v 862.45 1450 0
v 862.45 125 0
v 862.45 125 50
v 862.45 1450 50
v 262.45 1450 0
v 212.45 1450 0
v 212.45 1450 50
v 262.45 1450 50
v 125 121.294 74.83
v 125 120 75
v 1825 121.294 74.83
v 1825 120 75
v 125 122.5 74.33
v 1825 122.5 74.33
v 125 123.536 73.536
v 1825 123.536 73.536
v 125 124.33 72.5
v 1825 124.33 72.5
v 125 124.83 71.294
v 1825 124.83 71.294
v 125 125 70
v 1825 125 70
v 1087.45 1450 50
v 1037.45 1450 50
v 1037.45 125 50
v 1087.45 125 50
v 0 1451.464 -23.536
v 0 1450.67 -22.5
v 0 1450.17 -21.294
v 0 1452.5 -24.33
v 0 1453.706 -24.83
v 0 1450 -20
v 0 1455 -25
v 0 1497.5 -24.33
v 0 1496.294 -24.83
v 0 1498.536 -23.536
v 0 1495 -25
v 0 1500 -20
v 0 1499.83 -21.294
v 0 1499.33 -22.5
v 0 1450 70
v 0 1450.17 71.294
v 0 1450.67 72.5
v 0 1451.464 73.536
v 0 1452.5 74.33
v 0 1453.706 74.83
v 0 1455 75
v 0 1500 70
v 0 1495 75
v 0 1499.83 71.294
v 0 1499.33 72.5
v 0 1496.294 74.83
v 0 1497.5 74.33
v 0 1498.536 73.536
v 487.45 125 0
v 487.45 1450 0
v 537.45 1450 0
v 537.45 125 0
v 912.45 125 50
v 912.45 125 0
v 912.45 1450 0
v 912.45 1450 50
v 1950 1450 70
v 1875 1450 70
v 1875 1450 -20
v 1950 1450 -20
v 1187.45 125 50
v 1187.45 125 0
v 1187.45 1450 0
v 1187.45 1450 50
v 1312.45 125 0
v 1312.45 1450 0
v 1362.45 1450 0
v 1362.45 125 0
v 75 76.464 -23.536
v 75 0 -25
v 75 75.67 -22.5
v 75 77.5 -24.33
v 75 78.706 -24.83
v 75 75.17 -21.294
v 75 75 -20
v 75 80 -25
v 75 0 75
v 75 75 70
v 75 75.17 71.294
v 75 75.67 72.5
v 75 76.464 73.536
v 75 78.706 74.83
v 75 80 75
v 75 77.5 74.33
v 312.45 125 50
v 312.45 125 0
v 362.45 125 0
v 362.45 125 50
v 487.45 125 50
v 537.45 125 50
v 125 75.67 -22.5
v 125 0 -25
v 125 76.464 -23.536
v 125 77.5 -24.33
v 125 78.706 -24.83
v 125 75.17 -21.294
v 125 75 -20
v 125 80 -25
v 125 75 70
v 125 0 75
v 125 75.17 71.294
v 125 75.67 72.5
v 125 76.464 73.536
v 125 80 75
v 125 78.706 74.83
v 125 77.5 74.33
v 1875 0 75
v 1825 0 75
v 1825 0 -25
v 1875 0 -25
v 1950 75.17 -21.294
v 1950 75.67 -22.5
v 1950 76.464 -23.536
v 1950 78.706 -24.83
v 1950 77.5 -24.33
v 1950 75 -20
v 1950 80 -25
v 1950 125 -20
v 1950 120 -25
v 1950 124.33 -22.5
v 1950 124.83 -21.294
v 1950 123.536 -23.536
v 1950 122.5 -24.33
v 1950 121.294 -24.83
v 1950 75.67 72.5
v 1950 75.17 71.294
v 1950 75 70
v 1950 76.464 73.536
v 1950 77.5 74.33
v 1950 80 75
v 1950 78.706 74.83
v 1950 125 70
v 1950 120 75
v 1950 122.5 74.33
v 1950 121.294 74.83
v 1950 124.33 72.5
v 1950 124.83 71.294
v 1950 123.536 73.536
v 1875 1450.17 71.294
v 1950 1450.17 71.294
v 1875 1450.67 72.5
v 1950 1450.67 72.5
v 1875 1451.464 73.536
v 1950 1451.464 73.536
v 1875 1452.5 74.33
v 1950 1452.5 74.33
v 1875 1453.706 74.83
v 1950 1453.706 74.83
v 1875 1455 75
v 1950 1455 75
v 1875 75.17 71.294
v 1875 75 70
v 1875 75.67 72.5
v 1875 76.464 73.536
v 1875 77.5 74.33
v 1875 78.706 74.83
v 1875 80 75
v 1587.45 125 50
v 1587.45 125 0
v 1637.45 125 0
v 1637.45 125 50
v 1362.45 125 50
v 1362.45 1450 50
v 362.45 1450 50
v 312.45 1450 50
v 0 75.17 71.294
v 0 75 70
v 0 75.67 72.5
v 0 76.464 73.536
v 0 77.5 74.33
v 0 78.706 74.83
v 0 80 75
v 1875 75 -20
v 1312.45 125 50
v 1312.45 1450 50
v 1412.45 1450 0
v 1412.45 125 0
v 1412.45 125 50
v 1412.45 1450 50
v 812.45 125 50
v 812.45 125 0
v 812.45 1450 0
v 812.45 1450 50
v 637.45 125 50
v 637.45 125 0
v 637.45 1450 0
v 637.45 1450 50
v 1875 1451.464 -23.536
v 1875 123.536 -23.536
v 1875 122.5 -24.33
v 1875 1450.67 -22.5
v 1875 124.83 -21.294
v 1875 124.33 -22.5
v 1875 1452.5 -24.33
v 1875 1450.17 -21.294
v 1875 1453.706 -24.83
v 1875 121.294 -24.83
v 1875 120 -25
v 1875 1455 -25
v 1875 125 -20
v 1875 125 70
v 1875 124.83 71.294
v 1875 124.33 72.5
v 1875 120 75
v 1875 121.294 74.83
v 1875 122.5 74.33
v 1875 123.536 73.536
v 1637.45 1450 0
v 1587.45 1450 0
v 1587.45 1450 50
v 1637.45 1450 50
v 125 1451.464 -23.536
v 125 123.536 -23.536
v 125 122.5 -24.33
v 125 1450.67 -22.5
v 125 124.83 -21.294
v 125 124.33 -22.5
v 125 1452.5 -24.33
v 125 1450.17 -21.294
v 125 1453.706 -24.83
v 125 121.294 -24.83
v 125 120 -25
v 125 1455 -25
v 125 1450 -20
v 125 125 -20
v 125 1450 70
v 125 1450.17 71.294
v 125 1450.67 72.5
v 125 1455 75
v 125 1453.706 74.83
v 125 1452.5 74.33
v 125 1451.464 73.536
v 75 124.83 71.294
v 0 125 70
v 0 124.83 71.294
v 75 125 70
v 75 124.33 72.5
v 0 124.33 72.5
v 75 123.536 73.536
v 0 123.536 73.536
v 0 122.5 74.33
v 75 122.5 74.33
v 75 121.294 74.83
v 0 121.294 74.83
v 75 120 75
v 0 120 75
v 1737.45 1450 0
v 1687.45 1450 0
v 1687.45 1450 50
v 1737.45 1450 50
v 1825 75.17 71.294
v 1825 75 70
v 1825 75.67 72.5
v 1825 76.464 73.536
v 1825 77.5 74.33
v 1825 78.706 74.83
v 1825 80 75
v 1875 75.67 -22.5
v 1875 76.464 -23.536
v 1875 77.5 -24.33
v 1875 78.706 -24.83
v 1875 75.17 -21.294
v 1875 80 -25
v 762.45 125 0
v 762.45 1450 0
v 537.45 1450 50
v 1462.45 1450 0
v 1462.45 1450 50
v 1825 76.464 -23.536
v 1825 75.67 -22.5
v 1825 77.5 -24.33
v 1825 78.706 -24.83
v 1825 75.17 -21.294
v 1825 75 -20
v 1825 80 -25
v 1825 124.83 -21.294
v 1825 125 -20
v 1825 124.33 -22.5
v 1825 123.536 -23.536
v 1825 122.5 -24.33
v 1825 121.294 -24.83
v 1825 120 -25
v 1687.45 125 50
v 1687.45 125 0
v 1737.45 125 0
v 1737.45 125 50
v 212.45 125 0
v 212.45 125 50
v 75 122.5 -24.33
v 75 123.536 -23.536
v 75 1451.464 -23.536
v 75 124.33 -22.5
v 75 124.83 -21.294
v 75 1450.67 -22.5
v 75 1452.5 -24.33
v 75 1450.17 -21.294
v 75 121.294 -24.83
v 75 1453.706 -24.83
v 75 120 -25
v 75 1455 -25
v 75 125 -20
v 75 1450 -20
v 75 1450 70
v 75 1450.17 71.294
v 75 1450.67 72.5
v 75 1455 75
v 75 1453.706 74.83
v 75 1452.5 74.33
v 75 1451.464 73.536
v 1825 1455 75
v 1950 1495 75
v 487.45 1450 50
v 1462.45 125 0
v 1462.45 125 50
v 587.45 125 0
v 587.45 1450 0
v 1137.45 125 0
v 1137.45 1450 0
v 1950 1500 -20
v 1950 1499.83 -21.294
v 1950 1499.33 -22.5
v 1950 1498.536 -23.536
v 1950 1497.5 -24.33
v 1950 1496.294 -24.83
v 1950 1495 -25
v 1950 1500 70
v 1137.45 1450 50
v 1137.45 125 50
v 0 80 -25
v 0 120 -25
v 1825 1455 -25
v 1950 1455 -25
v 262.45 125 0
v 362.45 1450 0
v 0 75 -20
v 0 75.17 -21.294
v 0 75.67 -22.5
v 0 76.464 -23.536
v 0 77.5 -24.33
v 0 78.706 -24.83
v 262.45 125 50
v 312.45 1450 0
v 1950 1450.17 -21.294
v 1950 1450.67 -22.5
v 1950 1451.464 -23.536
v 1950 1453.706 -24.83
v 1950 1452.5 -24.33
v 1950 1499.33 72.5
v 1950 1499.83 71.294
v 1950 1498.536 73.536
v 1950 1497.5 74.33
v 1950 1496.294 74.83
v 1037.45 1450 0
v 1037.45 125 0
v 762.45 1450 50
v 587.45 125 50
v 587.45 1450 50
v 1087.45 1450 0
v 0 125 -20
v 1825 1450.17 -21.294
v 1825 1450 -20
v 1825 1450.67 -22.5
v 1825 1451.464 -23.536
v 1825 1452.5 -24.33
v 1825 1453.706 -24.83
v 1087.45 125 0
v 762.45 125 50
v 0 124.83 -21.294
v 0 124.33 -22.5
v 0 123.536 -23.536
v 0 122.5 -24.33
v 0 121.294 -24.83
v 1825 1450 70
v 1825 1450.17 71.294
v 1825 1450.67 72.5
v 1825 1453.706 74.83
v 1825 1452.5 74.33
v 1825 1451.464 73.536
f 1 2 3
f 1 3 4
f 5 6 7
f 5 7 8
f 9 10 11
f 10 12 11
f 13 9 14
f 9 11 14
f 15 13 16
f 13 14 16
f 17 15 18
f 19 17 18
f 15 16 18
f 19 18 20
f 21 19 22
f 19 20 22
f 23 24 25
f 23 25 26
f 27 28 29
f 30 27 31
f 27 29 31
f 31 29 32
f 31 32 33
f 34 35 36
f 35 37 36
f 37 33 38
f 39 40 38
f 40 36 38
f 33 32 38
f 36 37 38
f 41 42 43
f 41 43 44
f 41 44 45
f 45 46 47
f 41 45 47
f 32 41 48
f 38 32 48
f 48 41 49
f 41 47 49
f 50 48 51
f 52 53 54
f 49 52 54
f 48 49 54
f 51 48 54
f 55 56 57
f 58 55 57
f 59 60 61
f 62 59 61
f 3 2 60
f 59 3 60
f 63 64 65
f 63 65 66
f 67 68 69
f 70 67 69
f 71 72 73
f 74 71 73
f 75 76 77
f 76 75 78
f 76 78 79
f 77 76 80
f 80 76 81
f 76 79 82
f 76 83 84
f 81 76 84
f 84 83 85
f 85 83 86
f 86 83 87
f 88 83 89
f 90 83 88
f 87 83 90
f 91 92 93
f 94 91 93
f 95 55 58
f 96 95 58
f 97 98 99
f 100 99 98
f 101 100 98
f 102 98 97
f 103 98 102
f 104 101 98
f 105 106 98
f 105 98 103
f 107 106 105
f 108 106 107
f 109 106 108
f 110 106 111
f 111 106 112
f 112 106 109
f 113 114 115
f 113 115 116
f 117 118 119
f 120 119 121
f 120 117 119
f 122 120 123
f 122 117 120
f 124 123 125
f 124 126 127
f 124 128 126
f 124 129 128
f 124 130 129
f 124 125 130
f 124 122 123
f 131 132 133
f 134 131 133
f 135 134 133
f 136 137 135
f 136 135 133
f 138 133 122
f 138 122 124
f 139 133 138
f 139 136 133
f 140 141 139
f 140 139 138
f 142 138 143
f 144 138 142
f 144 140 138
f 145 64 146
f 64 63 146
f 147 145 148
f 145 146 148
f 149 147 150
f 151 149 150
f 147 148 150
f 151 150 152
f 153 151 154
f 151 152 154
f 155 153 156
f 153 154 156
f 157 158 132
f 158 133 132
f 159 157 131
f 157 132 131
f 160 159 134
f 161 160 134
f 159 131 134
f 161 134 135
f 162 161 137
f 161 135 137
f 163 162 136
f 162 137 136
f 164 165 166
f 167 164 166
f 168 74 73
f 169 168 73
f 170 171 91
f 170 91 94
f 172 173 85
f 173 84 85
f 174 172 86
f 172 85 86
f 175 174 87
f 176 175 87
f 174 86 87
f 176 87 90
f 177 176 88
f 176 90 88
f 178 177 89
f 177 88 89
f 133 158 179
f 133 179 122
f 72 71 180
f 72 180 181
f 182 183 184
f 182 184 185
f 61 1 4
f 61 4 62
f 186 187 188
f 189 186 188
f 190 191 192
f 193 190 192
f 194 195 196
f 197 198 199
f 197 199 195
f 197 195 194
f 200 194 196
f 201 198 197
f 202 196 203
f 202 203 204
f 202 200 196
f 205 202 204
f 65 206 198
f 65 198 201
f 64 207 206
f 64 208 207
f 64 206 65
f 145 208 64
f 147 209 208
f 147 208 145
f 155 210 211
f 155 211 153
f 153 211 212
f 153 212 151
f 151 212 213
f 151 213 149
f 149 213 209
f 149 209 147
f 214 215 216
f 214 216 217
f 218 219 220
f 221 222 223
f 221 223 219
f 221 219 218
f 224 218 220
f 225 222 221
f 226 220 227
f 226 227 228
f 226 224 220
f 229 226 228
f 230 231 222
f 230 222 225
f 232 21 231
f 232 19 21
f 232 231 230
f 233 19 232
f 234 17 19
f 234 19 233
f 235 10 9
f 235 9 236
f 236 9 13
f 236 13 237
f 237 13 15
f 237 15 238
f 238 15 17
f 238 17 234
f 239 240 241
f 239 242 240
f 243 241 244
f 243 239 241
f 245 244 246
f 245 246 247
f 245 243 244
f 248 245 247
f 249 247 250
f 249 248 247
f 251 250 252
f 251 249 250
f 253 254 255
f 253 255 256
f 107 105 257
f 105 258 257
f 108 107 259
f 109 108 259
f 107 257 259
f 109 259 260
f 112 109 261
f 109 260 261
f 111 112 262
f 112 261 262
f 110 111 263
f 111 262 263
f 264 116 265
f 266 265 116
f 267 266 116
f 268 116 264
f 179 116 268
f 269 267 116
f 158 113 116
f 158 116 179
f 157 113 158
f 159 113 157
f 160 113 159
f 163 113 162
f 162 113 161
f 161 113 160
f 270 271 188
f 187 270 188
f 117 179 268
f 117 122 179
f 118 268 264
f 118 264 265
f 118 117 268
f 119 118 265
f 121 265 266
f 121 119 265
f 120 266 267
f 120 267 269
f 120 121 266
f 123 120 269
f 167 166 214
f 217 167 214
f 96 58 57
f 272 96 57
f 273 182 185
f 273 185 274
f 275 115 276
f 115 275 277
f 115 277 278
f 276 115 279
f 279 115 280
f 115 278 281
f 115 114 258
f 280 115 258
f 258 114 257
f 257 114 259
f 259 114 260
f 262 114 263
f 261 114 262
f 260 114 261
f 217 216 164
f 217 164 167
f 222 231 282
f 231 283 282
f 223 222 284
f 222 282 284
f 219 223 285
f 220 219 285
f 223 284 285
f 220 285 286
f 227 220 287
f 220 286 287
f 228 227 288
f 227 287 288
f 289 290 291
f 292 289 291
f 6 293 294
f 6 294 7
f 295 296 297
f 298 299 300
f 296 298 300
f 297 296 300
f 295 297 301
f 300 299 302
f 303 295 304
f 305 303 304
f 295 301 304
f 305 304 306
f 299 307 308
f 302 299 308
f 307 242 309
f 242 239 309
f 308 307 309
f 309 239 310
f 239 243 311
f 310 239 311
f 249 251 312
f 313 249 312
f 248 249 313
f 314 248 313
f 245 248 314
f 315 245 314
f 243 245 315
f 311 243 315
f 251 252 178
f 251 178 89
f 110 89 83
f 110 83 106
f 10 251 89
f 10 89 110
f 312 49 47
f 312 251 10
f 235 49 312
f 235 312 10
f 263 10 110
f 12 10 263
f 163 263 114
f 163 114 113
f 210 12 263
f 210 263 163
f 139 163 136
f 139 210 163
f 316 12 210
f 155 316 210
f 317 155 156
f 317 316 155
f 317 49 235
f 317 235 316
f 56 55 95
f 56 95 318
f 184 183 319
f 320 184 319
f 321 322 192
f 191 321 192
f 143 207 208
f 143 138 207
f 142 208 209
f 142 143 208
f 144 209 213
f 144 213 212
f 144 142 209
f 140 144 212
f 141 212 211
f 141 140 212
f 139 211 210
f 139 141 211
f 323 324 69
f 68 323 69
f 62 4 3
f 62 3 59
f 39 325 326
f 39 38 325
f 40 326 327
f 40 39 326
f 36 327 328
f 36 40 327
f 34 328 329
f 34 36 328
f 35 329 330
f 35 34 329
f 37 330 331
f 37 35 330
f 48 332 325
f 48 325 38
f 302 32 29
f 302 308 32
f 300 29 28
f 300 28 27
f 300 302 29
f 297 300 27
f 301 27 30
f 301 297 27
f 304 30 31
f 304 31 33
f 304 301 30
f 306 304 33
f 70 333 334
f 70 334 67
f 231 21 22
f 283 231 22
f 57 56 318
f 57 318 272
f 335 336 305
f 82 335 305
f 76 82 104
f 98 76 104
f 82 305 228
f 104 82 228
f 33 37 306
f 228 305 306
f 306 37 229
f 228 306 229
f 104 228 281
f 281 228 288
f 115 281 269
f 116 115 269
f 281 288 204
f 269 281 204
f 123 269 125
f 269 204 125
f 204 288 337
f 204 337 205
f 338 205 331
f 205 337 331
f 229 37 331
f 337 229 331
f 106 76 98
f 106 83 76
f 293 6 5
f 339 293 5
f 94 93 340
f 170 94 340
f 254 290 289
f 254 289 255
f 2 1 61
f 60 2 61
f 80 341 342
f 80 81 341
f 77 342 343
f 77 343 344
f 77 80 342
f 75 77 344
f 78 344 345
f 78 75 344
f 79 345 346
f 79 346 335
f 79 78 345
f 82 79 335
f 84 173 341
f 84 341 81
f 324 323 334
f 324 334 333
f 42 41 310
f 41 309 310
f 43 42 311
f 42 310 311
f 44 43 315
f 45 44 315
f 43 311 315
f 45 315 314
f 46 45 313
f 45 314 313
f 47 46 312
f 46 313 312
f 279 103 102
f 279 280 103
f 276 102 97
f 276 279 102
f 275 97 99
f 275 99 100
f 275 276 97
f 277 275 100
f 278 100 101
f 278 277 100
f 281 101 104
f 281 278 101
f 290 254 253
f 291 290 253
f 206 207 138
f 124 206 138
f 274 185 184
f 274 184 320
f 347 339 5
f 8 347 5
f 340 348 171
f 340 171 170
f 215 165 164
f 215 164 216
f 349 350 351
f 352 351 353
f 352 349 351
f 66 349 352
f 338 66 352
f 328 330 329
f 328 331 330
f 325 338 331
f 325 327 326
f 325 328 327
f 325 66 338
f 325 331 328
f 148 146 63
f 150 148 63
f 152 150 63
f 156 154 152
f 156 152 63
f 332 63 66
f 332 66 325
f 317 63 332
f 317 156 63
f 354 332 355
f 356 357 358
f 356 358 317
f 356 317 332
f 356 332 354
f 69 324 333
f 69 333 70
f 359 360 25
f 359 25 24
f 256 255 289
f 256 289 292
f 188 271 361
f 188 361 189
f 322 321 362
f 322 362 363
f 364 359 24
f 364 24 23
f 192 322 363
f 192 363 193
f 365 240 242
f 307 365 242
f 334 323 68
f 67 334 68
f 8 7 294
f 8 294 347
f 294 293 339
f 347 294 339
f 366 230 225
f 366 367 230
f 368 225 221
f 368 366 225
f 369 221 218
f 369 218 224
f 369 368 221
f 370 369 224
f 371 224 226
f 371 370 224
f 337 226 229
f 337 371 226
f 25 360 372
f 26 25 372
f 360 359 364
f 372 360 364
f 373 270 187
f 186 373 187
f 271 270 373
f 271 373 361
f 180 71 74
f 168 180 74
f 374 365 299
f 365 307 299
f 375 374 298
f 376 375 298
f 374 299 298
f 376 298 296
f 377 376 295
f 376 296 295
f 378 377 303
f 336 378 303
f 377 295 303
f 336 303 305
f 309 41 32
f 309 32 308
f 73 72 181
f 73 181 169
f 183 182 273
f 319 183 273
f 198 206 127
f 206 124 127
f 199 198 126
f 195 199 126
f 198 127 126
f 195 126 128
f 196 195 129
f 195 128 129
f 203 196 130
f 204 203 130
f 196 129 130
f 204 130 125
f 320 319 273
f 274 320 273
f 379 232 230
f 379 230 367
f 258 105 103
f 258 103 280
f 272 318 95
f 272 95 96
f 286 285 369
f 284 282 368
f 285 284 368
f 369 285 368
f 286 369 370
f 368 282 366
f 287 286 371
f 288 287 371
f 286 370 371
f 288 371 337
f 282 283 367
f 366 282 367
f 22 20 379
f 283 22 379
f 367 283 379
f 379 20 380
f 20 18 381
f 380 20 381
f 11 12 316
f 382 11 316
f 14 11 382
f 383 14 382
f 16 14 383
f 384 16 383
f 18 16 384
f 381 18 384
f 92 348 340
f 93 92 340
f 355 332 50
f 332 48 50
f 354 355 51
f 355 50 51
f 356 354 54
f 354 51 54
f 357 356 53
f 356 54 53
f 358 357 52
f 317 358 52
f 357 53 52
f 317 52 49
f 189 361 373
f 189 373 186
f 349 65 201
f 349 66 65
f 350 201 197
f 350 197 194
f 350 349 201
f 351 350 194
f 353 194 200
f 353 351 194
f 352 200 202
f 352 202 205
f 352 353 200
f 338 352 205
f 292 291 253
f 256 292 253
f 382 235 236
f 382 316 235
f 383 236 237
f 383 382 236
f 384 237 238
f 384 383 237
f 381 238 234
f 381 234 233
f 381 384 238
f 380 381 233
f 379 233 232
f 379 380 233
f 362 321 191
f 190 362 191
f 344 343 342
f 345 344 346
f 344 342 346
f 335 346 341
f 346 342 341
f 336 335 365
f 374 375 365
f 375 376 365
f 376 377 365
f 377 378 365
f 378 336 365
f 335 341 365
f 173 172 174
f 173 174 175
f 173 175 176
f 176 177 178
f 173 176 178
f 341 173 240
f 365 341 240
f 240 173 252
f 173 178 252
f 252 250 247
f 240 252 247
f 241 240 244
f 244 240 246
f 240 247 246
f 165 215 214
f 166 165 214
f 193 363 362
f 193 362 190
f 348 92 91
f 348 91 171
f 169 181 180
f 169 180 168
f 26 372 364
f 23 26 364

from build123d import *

# Parameters (mm, degrees)
F0_W          = 75
F0_H          = 50
F0_W_2        = 50
F0_W_3        = 1700
F0_H_2        = 1325
F0_H_3        = 75
F1_DEPTH      = 75
F1_DEPTH_BACK = 25
F2_R          = 5
F3_W          = 50
F3_H          = 1325
F4_DEPTH      = 50


with BuildPart() as f1:
    # F0 (on Top) → F1 (new body, two sides)
    with BuildSketch(Plane.XY) as f1_sk:
        with Locations((37.5, 1475)):
            Rectangle(F0_W, F0_H)
        with Locations((100, 1475)):
            Rectangle(F0_W_2, F0_H)
        with Locations((975, 1475)):
            Rectangle(F0_W_3, F0_H)
        with Locations((100, 787.5)):
            Rectangle(F0_W_2, F0_H_2)
        with Locations((1850, 1475)):
            Rectangle(F0_W_2, F0_H)
        with Locations((37.5, 100)):
            Rectangle(F0_W, F0_H)
        with Locations((100, 100)):
            Rectangle(F0_W_2, F0_H)
        with Locations((1912.5, 1475)):
            Rectangle(F0_W, F0_H)
        with Locations((1850, 787.5)):
            Rectangle(F0_W_2, F0_H_2)
        with Locations((975, 100)):
            Rectangle(F0_W_3, F0_H)
        with Locations((100, 37.5)):
            Rectangle(F0_W_2, F0_H_3)
        with Locations((1850, 100)):
            Rectangle(F0_W_2, F0_H)
        with Locations((1912.5, 100)):
            Rectangle(F0_W, F0_H)
        with Locations((1850, 37.5)):
            Rectangle(F0_W_2, F0_H_3)
    extrude(amount=F1_DEPTH)
    extrude(f1_sk.sketch, amount=-F1_DEPTH_BACK)

    # F2
    f2_edges = [f1.edges().sort_by_distance(p)[0] for p in [
        (975, 1450, 75),
        (975, 1500, 75),
        (975, 125, 75),
        (975, 75, 75),
        (37.5, 75, 75),
        (37.5, 125, 75),
        (1912.5, 125, 75),
        (1912.5, 75, 75),
        (1912.5, 1450, 75),
        (37.5, 1450, 75),
        (975, 1500, -25),
        (975, 1450, -25),
        (1912.5, 1450, -25),
        (1912.5, 75, -25),
        (1912.5, 125, -25),
        (975, 125, -25),
        (975, 75, -25),
        (37.5, 125, -25),
        (37.5, 75, -25),
        (37.5, 1450, -25),
    ]]
    fillet(f2_edges, radius=F2_R)


with BuildPart() as f4:
    # F3 (on Top) → F4 (new body)
    with BuildSketch(Plane.XY):
        with Locations((237.45, 787.5)):
            Rectangle(F3_W, F3_H)
    extrude(amount=F4_DEPTH)


with BuildPart() as f4b:
    # F3 (on Top) → F4, piece 2 (new body)
    with BuildSketch(Plane.XY):
        with Locations((337.45, 787.5)):
            Rectangle(F3_W, F3_H)
    extrude(amount=F4_DEPTH)


with BuildPart() as f4c:
    # F3 (on Top) → F4, piece 3 (new body)
    with BuildSketch(Plane.XY):
        with Locations((612.45, 787.5)):
            Rectangle(F3_W, F3_H)
    extrude(amount=F4_DEPTH)


with BuildPart() as f4d:
    # F3 (on Top) → F4, piece 4 (new body)
    with BuildSketch(Plane.XY):
        with Locations((512.45, 787.5)):
            Rectangle(F3_W, F3_H)
    extrude(amount=F4_DEPTH)


with BuildPart() as f4e:
    # F3 (on Top) → F4, piece 5 (new body)
    with BuildSketch(Plane.XY):
        with Locations((887.45, 787.5)):
            Rectangle(F3_W, F3_H)
    extrude(amount=F4_DEPTH)


with BuildPart() as f4f:
    # F3 (on Top) → F4, piece 6 (new body)
    with BuildSketch(Plane.XY):
        with Locations((787.45, 787.5)):
            Rectangle(F3_W, F3_H)
    extrude(amount=F4_DEPTH)


with BuildPart() as f4g:
    # F3 (on Top) → F4, piece 7 (new body)
    with BuildSketch(Plane.XY):
        with Locations((1162.45, 787.5)):
            Rectangle(F3_W, F3_H)
    extrude(amount=F4_DEPTH)


with BuildPart() as f4h:
    # F3 (on Top) → F4, piece 8 (new body)
    with BuildSketch(Plane.XY):
        with Locations((1062.45, 787.5)):
            Rectangle(F3_W, F3_H)
    extrude(amount=F4_DEPTH)


with BuildPart() as f4i:
    # F3 (on Top) → F4, piece 9 (new body)
    with BuildSketch(Plane.XY):
        with Locations((1437.45, 787.5)):
            Rectangle(F3_W, F3_H)
    extrude(amount=F4_DEPTH)


with BuildPart() as f4j:
    # F3 (on Top) → F4, piece 10 (new body)
    with BuildSketch(Plane.XY):
        with Locations((1337.45, 787.5)):
            Rectangle(F3_W, F3_H)
    extrude(amount=F4_DEPTH)


with BuildPart() as f4k:
    # F3 (on Top) → F4, piece 11 (new body)
    with BuildSketch(Plane.XY):
        with Locations((1712.45, 787.5)):
            Rectangle(F3_W, F3_H)
    extrude(amount=F4_DEPTH)


with BuildPart() as f4l:
    # F3 (on Top) → F4, piece 12 (new body)
    with BuildSketch(Plane.XY):
        with Locations((1612.45, 787.5)):
            Rectangle(F3_W, F3_H)
    extrude(amount=F4_DEPTH)


solid = Compound([f1.part, f4.part, f4b.part, f4c.part, f4d.part, f4e.part, f4f.part, f4g.part, f4h.part, f4i.part, f4j.part, f4k.part, f4l.part])
